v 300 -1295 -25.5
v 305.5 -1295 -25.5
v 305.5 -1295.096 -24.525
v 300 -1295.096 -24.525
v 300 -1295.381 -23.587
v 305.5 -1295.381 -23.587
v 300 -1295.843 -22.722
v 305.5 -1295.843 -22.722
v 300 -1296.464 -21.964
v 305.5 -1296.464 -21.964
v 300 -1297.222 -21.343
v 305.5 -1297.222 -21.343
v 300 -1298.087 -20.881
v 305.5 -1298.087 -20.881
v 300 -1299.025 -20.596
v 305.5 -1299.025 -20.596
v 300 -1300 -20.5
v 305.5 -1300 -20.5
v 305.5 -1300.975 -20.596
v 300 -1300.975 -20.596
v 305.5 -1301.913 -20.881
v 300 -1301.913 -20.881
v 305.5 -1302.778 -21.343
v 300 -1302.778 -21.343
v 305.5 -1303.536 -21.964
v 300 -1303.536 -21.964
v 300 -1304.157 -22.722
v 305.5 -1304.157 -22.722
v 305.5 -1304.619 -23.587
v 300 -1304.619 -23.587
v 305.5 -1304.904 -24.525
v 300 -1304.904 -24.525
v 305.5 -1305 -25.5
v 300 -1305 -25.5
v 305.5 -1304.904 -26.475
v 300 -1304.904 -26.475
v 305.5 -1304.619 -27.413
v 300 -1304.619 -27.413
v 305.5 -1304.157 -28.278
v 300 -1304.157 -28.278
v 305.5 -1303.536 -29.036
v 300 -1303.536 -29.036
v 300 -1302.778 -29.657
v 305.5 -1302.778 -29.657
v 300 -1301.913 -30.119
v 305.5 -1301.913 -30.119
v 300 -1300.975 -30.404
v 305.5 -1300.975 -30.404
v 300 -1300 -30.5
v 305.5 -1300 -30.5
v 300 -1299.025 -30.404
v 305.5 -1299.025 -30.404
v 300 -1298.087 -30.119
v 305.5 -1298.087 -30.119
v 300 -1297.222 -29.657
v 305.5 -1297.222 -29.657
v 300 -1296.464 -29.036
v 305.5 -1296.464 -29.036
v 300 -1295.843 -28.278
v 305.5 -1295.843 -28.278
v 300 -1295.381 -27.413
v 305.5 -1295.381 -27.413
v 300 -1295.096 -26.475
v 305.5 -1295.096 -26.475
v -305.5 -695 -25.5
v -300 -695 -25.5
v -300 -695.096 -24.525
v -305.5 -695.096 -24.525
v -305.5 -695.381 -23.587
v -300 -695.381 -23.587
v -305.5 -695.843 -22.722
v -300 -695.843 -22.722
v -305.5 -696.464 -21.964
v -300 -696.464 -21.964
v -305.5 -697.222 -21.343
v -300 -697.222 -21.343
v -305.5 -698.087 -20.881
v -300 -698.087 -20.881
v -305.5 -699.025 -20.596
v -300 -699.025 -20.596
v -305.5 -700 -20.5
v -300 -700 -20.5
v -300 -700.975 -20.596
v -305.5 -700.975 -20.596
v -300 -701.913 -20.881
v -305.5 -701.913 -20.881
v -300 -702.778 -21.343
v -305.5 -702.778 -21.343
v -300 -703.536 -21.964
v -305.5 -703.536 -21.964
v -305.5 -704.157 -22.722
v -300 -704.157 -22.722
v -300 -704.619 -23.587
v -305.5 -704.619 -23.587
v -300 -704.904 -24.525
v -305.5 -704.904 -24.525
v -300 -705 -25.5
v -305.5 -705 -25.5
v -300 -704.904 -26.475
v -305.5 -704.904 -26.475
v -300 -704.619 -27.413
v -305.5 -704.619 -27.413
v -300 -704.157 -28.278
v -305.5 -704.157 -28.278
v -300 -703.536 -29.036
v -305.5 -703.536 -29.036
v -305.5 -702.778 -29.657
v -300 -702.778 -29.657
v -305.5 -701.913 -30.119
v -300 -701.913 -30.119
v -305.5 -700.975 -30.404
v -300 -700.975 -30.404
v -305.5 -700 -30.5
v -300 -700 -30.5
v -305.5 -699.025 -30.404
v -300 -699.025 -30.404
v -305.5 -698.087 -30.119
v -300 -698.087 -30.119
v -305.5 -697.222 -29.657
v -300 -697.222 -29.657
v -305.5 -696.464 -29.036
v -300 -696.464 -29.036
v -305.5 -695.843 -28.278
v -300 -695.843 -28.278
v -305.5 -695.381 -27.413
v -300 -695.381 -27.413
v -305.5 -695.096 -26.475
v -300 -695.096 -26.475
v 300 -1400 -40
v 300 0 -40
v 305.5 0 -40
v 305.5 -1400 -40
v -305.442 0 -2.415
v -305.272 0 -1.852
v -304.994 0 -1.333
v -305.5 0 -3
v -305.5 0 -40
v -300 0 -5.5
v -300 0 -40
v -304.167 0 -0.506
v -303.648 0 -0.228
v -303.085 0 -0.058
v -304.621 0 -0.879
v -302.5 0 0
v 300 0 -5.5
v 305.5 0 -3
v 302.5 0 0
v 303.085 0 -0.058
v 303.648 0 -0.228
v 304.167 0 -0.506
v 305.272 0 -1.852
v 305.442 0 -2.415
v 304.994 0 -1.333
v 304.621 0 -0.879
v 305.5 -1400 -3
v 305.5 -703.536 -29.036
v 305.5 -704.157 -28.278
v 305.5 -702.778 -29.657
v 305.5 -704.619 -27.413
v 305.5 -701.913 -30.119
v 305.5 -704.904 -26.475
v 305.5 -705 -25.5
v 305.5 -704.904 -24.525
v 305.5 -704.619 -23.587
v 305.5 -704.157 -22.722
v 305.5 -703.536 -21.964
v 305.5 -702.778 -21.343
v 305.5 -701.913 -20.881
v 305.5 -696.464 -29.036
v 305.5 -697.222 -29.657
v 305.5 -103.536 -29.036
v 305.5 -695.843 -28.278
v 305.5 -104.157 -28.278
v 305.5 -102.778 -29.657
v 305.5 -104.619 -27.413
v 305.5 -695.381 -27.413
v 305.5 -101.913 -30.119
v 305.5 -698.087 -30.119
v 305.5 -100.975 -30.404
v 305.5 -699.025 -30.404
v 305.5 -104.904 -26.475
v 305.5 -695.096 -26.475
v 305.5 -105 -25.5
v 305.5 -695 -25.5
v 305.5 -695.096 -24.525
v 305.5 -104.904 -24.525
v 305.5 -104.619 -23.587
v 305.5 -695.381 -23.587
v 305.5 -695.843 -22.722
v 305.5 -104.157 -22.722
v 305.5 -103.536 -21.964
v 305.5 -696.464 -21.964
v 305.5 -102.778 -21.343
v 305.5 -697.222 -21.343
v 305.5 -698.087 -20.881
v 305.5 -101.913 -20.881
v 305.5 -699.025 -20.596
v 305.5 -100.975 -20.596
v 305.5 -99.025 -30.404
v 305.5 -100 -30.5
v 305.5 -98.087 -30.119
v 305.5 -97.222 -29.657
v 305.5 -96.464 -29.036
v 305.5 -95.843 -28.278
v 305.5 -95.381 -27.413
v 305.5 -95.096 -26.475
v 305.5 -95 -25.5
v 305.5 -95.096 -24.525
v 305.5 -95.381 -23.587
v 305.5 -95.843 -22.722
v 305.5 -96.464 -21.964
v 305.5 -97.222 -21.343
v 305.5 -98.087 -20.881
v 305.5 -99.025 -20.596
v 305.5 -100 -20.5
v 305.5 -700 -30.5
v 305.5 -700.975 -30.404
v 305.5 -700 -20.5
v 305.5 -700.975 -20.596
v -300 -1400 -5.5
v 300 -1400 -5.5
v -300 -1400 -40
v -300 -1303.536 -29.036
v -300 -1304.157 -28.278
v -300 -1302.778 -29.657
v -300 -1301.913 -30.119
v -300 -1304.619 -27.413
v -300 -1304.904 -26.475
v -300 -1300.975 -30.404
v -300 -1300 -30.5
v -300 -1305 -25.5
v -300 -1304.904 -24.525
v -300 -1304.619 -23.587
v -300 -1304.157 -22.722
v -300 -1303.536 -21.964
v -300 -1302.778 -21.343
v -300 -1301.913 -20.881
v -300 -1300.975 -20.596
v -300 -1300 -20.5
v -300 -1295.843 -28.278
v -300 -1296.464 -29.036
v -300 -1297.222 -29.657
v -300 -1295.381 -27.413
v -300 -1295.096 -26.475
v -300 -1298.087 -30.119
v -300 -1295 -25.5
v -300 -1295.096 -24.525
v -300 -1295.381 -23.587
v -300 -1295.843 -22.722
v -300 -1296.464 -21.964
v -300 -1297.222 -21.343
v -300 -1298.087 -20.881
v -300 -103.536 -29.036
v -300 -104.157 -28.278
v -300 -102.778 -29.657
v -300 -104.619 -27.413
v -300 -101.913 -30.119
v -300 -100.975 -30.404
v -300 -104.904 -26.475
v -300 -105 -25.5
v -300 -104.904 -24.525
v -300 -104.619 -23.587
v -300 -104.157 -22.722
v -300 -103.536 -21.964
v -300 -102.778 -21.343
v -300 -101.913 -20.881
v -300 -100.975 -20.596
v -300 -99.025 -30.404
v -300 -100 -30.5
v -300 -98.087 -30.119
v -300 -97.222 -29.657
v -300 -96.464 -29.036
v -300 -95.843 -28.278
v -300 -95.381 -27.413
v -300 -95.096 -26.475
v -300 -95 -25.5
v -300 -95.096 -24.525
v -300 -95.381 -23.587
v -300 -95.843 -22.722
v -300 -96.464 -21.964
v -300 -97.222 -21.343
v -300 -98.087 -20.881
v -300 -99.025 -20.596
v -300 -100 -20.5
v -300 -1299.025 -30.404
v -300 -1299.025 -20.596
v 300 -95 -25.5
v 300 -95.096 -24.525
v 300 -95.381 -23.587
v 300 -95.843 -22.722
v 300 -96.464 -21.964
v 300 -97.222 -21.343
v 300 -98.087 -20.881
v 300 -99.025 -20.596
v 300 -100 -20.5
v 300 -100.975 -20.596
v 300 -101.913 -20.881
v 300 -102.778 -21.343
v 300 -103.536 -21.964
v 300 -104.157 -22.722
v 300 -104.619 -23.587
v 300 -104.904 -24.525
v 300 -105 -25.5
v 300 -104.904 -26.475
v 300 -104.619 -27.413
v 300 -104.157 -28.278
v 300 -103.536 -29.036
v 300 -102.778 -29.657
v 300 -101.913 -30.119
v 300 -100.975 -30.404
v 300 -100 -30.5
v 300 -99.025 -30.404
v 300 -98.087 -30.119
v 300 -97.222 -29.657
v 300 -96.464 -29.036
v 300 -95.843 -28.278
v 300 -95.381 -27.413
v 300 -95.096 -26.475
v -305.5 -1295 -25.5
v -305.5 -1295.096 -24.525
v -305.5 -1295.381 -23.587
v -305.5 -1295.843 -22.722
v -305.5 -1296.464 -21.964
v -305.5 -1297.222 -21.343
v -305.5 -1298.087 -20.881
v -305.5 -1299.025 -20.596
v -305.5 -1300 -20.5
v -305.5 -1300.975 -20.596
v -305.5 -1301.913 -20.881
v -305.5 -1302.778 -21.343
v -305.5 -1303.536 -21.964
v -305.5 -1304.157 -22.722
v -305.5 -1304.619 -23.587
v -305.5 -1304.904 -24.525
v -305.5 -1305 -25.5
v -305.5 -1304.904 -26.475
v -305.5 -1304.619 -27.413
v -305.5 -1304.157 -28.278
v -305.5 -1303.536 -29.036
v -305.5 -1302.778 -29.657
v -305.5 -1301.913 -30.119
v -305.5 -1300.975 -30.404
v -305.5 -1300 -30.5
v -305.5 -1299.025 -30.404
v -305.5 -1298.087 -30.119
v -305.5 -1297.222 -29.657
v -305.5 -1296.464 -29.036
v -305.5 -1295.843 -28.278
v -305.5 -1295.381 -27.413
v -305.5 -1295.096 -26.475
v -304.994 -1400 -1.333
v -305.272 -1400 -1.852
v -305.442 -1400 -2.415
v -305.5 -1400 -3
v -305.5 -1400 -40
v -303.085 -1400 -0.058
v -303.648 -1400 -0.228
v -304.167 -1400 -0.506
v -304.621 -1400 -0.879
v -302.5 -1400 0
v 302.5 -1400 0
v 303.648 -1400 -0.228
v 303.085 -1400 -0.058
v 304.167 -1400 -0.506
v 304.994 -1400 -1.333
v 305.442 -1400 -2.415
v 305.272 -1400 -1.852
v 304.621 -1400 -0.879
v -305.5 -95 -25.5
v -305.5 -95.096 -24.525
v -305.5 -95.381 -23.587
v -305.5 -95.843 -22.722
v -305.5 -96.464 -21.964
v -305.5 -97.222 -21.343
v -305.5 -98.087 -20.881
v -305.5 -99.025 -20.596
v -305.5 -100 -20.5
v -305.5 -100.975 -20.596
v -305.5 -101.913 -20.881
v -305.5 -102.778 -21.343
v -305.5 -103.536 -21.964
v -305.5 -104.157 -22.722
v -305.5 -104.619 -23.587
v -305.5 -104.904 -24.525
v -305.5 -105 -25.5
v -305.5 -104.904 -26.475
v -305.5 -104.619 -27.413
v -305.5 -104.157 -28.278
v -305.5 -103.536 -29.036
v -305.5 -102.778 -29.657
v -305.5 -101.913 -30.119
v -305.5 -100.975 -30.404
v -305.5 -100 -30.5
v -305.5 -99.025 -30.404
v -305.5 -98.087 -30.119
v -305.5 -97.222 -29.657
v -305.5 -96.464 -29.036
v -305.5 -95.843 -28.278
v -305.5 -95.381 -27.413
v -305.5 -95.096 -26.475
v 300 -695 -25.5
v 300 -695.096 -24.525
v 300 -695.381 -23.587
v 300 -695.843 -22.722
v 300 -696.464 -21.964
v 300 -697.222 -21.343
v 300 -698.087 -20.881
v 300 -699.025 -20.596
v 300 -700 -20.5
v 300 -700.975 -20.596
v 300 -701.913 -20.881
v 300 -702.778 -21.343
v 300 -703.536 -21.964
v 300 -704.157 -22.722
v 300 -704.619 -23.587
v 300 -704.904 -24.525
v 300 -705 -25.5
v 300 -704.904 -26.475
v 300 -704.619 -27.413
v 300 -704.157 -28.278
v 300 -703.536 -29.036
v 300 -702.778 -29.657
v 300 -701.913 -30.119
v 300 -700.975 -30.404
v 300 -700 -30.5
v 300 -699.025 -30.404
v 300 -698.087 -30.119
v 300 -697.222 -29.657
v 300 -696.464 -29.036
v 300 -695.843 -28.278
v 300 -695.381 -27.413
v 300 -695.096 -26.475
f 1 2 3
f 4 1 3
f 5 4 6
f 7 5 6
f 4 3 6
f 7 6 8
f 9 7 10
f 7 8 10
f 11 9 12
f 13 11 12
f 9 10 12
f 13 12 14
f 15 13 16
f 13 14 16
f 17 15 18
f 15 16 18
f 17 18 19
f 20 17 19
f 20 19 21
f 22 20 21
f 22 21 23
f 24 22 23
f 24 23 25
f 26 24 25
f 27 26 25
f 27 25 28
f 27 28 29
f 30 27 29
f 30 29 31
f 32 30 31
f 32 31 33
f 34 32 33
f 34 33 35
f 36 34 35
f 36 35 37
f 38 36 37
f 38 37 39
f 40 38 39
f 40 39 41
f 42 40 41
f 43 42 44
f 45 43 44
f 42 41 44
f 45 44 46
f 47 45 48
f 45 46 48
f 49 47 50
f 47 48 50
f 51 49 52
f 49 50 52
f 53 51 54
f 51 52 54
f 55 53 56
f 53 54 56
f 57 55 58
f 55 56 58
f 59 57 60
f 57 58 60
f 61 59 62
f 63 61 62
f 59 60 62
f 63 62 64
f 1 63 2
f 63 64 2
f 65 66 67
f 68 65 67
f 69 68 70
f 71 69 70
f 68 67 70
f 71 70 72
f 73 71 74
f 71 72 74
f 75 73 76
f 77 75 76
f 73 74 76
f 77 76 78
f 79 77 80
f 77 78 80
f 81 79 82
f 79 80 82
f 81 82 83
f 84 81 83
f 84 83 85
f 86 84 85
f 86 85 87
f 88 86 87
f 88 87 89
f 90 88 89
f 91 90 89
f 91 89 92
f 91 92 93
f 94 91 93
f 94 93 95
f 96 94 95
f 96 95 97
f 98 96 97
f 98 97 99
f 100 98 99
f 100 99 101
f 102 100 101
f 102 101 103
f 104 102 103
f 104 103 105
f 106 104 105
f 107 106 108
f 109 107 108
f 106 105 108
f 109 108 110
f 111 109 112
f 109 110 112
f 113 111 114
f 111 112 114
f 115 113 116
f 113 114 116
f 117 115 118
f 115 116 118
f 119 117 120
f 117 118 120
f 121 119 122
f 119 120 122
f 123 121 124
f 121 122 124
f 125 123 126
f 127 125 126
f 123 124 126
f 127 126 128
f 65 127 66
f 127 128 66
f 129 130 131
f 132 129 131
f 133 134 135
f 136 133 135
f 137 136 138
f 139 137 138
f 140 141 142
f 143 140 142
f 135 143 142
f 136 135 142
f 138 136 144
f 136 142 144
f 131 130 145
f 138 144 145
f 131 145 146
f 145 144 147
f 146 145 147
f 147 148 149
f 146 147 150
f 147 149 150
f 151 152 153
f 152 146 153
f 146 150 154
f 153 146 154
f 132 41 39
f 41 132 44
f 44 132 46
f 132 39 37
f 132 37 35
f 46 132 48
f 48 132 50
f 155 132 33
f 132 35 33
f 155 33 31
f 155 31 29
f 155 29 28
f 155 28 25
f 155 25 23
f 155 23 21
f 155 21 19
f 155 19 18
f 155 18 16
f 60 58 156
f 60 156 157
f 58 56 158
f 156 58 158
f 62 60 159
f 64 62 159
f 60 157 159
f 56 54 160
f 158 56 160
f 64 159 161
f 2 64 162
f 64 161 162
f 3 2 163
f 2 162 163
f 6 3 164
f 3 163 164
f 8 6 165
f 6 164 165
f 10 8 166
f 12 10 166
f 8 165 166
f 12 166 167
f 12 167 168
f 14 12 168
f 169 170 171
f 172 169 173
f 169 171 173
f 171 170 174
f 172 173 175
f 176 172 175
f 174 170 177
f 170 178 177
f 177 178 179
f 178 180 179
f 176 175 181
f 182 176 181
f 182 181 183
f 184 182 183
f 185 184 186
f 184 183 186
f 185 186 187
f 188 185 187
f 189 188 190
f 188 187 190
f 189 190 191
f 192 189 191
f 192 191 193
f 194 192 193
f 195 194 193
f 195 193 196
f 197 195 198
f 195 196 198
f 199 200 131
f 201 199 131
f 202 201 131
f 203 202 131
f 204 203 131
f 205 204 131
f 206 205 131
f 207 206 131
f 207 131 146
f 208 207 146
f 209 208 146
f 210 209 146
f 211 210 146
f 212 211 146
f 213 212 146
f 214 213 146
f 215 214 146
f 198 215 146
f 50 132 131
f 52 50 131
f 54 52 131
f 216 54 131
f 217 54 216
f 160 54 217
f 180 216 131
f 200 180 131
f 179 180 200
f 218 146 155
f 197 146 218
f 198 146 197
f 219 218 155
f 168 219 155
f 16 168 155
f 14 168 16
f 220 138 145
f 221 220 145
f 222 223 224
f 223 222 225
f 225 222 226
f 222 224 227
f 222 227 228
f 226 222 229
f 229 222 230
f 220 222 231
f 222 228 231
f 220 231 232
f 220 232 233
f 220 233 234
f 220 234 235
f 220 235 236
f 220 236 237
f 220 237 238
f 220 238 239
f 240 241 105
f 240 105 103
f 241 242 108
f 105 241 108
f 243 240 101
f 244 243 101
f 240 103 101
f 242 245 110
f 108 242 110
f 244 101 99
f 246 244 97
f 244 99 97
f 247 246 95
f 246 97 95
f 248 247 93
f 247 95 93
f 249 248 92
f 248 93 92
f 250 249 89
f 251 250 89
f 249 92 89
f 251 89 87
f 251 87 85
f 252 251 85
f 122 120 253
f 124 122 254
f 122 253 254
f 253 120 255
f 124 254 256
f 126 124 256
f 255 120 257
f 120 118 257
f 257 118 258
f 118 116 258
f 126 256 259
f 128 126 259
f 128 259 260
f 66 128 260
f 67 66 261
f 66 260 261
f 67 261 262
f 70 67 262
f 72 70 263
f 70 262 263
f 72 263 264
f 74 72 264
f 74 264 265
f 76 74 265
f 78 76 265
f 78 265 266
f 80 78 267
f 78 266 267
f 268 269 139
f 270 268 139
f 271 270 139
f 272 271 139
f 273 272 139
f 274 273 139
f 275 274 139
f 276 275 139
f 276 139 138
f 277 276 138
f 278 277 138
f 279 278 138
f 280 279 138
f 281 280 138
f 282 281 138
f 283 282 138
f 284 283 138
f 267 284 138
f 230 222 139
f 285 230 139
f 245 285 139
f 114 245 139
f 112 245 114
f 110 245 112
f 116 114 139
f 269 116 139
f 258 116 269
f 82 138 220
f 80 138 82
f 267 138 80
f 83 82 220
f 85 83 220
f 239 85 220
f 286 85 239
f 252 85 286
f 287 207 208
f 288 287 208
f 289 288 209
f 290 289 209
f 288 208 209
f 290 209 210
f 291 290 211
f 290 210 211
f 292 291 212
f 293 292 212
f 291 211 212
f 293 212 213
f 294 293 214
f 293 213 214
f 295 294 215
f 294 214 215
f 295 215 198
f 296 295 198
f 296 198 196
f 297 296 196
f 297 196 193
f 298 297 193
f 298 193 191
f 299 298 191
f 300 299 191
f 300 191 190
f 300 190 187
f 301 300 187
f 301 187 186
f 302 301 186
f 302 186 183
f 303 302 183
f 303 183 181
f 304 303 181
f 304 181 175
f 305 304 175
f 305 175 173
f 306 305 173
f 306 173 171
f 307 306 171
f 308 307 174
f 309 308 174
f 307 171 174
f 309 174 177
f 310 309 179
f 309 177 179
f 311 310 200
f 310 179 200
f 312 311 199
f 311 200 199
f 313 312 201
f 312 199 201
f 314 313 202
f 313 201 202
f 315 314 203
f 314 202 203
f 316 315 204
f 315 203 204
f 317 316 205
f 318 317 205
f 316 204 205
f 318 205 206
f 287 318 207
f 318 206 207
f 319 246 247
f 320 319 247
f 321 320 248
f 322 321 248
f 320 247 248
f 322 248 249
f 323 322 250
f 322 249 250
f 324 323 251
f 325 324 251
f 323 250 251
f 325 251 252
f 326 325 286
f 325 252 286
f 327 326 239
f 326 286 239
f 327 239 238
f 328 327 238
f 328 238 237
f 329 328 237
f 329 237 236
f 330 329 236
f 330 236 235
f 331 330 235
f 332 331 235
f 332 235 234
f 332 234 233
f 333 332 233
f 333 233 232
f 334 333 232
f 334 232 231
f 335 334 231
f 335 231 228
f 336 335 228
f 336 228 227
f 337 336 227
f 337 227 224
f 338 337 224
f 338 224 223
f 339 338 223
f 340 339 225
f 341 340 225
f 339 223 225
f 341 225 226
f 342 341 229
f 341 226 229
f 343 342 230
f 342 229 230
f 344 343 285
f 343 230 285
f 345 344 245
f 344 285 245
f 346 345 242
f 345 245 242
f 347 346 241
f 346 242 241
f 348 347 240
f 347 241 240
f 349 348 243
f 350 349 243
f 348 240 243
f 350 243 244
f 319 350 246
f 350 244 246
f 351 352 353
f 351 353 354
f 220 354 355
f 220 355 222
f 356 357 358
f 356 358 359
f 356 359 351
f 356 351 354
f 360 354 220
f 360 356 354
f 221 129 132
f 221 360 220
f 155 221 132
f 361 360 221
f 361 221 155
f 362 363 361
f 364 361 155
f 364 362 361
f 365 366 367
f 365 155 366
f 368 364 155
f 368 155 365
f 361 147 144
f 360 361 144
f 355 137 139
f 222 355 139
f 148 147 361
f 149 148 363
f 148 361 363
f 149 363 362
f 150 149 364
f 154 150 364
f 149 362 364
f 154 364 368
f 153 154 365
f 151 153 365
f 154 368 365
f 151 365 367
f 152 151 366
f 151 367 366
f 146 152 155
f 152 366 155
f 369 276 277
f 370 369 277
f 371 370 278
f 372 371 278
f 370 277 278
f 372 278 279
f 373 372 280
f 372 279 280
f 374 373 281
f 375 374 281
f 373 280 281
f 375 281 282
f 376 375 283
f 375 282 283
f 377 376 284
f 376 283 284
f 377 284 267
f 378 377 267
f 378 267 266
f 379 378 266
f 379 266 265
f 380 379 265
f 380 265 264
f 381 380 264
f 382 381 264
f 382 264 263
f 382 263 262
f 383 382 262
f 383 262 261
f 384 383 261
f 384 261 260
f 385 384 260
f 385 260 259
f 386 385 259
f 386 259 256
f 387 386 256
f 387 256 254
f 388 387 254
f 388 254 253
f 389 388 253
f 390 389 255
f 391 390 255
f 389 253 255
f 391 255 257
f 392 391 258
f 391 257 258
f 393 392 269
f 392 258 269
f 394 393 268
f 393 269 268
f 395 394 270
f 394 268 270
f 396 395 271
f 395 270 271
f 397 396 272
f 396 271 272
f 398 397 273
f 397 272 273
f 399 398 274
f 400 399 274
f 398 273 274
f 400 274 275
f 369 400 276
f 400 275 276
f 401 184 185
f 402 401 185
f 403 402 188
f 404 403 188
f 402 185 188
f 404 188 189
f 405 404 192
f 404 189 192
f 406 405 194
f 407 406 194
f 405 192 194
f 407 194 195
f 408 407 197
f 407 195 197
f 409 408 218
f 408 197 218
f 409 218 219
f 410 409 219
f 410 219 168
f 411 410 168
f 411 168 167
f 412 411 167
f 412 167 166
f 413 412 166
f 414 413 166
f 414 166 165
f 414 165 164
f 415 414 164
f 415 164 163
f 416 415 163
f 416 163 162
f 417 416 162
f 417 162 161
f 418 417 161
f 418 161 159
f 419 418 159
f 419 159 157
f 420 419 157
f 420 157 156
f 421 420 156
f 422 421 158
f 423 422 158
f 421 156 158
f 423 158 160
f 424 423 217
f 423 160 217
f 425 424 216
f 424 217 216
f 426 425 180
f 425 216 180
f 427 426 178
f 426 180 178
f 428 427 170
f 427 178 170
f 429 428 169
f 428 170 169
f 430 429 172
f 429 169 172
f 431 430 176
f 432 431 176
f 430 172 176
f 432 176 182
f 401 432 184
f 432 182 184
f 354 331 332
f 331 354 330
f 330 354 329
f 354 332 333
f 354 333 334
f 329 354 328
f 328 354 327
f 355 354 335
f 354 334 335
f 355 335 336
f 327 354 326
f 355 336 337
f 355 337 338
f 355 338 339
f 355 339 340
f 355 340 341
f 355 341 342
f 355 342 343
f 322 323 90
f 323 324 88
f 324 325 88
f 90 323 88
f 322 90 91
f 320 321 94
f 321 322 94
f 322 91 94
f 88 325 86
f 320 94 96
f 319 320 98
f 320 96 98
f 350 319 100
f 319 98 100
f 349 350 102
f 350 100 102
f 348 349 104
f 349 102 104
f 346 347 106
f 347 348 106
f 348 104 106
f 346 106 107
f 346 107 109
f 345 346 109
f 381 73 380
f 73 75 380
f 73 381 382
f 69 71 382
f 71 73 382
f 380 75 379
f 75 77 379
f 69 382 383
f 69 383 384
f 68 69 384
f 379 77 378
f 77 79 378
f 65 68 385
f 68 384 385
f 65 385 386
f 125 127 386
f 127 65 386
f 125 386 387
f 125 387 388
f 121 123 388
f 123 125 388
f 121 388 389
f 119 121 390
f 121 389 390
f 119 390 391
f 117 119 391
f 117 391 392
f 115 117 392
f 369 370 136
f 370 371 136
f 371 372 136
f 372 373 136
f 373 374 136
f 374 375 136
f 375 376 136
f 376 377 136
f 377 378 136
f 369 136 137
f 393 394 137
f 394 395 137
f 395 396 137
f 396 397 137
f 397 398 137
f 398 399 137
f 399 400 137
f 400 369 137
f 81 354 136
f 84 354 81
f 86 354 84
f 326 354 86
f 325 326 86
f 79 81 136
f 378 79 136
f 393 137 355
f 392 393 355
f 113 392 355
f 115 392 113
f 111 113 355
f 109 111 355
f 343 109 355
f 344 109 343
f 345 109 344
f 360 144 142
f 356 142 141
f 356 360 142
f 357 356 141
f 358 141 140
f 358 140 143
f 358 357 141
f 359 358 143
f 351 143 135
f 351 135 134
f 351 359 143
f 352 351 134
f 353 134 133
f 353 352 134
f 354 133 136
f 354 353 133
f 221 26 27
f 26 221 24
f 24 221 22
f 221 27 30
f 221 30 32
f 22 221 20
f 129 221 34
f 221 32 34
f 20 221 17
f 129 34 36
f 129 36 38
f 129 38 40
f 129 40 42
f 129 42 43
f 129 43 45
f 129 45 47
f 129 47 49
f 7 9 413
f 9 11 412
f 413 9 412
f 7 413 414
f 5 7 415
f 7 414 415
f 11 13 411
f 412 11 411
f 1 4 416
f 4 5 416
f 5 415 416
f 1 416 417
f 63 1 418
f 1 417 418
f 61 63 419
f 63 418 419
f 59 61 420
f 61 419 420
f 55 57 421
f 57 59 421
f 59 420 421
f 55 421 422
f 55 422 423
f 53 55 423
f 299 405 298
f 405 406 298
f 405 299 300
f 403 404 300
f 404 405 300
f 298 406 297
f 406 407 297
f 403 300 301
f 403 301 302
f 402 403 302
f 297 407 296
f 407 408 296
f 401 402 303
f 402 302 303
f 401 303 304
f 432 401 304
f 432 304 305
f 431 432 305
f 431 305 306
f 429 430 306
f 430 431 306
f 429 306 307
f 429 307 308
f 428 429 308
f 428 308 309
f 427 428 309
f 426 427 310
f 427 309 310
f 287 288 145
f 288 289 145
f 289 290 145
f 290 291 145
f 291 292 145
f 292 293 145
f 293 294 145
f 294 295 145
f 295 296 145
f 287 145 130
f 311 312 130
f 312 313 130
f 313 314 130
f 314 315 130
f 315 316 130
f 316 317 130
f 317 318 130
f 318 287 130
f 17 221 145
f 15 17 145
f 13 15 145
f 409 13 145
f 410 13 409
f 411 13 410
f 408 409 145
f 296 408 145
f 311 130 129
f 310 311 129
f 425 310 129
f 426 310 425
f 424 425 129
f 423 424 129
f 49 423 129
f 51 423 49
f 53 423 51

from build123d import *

# Parameters (mm, degrees)
F1_DEPTH = 1400
F3_R     = 3
F4_D     = 10
F4_DEPTH = 3000


with BuildPart() as f1:
    # F0 (on Front) → F1 (new body)
    with BuildSketch(Plane.XZ):
        Polygon((305.5, 0), (0, 0), (-305.5, 0), (-305.5, -40), (-300, -40), (-300, -5.5), (0, -5.5), (300, -5.5), (300, -14.070651), (300, -40), (305.5, -40), align=None)
    extrude(amount=F1_DEPTH)

    # F3
    f3_edges = [f1.edges().sort_by_distance(p)[0] for p in [
        (-305.5, -700, 0),
        (305.5, -700, 0),
    ]]
    fillet(f3_edges, radius=F3_R)

    # F4
    with Locations(Plane(origin=(-305.5, 0, 0), x_dir=(0, -1, 0), z_dir=(-1, 0, 0))):
        with Locations((100, -25.5), (700, -25.5), (1300, -25.5)):
            Hole(F4_D / 2, depth=F4_DEPTH)


solid = f1.part
